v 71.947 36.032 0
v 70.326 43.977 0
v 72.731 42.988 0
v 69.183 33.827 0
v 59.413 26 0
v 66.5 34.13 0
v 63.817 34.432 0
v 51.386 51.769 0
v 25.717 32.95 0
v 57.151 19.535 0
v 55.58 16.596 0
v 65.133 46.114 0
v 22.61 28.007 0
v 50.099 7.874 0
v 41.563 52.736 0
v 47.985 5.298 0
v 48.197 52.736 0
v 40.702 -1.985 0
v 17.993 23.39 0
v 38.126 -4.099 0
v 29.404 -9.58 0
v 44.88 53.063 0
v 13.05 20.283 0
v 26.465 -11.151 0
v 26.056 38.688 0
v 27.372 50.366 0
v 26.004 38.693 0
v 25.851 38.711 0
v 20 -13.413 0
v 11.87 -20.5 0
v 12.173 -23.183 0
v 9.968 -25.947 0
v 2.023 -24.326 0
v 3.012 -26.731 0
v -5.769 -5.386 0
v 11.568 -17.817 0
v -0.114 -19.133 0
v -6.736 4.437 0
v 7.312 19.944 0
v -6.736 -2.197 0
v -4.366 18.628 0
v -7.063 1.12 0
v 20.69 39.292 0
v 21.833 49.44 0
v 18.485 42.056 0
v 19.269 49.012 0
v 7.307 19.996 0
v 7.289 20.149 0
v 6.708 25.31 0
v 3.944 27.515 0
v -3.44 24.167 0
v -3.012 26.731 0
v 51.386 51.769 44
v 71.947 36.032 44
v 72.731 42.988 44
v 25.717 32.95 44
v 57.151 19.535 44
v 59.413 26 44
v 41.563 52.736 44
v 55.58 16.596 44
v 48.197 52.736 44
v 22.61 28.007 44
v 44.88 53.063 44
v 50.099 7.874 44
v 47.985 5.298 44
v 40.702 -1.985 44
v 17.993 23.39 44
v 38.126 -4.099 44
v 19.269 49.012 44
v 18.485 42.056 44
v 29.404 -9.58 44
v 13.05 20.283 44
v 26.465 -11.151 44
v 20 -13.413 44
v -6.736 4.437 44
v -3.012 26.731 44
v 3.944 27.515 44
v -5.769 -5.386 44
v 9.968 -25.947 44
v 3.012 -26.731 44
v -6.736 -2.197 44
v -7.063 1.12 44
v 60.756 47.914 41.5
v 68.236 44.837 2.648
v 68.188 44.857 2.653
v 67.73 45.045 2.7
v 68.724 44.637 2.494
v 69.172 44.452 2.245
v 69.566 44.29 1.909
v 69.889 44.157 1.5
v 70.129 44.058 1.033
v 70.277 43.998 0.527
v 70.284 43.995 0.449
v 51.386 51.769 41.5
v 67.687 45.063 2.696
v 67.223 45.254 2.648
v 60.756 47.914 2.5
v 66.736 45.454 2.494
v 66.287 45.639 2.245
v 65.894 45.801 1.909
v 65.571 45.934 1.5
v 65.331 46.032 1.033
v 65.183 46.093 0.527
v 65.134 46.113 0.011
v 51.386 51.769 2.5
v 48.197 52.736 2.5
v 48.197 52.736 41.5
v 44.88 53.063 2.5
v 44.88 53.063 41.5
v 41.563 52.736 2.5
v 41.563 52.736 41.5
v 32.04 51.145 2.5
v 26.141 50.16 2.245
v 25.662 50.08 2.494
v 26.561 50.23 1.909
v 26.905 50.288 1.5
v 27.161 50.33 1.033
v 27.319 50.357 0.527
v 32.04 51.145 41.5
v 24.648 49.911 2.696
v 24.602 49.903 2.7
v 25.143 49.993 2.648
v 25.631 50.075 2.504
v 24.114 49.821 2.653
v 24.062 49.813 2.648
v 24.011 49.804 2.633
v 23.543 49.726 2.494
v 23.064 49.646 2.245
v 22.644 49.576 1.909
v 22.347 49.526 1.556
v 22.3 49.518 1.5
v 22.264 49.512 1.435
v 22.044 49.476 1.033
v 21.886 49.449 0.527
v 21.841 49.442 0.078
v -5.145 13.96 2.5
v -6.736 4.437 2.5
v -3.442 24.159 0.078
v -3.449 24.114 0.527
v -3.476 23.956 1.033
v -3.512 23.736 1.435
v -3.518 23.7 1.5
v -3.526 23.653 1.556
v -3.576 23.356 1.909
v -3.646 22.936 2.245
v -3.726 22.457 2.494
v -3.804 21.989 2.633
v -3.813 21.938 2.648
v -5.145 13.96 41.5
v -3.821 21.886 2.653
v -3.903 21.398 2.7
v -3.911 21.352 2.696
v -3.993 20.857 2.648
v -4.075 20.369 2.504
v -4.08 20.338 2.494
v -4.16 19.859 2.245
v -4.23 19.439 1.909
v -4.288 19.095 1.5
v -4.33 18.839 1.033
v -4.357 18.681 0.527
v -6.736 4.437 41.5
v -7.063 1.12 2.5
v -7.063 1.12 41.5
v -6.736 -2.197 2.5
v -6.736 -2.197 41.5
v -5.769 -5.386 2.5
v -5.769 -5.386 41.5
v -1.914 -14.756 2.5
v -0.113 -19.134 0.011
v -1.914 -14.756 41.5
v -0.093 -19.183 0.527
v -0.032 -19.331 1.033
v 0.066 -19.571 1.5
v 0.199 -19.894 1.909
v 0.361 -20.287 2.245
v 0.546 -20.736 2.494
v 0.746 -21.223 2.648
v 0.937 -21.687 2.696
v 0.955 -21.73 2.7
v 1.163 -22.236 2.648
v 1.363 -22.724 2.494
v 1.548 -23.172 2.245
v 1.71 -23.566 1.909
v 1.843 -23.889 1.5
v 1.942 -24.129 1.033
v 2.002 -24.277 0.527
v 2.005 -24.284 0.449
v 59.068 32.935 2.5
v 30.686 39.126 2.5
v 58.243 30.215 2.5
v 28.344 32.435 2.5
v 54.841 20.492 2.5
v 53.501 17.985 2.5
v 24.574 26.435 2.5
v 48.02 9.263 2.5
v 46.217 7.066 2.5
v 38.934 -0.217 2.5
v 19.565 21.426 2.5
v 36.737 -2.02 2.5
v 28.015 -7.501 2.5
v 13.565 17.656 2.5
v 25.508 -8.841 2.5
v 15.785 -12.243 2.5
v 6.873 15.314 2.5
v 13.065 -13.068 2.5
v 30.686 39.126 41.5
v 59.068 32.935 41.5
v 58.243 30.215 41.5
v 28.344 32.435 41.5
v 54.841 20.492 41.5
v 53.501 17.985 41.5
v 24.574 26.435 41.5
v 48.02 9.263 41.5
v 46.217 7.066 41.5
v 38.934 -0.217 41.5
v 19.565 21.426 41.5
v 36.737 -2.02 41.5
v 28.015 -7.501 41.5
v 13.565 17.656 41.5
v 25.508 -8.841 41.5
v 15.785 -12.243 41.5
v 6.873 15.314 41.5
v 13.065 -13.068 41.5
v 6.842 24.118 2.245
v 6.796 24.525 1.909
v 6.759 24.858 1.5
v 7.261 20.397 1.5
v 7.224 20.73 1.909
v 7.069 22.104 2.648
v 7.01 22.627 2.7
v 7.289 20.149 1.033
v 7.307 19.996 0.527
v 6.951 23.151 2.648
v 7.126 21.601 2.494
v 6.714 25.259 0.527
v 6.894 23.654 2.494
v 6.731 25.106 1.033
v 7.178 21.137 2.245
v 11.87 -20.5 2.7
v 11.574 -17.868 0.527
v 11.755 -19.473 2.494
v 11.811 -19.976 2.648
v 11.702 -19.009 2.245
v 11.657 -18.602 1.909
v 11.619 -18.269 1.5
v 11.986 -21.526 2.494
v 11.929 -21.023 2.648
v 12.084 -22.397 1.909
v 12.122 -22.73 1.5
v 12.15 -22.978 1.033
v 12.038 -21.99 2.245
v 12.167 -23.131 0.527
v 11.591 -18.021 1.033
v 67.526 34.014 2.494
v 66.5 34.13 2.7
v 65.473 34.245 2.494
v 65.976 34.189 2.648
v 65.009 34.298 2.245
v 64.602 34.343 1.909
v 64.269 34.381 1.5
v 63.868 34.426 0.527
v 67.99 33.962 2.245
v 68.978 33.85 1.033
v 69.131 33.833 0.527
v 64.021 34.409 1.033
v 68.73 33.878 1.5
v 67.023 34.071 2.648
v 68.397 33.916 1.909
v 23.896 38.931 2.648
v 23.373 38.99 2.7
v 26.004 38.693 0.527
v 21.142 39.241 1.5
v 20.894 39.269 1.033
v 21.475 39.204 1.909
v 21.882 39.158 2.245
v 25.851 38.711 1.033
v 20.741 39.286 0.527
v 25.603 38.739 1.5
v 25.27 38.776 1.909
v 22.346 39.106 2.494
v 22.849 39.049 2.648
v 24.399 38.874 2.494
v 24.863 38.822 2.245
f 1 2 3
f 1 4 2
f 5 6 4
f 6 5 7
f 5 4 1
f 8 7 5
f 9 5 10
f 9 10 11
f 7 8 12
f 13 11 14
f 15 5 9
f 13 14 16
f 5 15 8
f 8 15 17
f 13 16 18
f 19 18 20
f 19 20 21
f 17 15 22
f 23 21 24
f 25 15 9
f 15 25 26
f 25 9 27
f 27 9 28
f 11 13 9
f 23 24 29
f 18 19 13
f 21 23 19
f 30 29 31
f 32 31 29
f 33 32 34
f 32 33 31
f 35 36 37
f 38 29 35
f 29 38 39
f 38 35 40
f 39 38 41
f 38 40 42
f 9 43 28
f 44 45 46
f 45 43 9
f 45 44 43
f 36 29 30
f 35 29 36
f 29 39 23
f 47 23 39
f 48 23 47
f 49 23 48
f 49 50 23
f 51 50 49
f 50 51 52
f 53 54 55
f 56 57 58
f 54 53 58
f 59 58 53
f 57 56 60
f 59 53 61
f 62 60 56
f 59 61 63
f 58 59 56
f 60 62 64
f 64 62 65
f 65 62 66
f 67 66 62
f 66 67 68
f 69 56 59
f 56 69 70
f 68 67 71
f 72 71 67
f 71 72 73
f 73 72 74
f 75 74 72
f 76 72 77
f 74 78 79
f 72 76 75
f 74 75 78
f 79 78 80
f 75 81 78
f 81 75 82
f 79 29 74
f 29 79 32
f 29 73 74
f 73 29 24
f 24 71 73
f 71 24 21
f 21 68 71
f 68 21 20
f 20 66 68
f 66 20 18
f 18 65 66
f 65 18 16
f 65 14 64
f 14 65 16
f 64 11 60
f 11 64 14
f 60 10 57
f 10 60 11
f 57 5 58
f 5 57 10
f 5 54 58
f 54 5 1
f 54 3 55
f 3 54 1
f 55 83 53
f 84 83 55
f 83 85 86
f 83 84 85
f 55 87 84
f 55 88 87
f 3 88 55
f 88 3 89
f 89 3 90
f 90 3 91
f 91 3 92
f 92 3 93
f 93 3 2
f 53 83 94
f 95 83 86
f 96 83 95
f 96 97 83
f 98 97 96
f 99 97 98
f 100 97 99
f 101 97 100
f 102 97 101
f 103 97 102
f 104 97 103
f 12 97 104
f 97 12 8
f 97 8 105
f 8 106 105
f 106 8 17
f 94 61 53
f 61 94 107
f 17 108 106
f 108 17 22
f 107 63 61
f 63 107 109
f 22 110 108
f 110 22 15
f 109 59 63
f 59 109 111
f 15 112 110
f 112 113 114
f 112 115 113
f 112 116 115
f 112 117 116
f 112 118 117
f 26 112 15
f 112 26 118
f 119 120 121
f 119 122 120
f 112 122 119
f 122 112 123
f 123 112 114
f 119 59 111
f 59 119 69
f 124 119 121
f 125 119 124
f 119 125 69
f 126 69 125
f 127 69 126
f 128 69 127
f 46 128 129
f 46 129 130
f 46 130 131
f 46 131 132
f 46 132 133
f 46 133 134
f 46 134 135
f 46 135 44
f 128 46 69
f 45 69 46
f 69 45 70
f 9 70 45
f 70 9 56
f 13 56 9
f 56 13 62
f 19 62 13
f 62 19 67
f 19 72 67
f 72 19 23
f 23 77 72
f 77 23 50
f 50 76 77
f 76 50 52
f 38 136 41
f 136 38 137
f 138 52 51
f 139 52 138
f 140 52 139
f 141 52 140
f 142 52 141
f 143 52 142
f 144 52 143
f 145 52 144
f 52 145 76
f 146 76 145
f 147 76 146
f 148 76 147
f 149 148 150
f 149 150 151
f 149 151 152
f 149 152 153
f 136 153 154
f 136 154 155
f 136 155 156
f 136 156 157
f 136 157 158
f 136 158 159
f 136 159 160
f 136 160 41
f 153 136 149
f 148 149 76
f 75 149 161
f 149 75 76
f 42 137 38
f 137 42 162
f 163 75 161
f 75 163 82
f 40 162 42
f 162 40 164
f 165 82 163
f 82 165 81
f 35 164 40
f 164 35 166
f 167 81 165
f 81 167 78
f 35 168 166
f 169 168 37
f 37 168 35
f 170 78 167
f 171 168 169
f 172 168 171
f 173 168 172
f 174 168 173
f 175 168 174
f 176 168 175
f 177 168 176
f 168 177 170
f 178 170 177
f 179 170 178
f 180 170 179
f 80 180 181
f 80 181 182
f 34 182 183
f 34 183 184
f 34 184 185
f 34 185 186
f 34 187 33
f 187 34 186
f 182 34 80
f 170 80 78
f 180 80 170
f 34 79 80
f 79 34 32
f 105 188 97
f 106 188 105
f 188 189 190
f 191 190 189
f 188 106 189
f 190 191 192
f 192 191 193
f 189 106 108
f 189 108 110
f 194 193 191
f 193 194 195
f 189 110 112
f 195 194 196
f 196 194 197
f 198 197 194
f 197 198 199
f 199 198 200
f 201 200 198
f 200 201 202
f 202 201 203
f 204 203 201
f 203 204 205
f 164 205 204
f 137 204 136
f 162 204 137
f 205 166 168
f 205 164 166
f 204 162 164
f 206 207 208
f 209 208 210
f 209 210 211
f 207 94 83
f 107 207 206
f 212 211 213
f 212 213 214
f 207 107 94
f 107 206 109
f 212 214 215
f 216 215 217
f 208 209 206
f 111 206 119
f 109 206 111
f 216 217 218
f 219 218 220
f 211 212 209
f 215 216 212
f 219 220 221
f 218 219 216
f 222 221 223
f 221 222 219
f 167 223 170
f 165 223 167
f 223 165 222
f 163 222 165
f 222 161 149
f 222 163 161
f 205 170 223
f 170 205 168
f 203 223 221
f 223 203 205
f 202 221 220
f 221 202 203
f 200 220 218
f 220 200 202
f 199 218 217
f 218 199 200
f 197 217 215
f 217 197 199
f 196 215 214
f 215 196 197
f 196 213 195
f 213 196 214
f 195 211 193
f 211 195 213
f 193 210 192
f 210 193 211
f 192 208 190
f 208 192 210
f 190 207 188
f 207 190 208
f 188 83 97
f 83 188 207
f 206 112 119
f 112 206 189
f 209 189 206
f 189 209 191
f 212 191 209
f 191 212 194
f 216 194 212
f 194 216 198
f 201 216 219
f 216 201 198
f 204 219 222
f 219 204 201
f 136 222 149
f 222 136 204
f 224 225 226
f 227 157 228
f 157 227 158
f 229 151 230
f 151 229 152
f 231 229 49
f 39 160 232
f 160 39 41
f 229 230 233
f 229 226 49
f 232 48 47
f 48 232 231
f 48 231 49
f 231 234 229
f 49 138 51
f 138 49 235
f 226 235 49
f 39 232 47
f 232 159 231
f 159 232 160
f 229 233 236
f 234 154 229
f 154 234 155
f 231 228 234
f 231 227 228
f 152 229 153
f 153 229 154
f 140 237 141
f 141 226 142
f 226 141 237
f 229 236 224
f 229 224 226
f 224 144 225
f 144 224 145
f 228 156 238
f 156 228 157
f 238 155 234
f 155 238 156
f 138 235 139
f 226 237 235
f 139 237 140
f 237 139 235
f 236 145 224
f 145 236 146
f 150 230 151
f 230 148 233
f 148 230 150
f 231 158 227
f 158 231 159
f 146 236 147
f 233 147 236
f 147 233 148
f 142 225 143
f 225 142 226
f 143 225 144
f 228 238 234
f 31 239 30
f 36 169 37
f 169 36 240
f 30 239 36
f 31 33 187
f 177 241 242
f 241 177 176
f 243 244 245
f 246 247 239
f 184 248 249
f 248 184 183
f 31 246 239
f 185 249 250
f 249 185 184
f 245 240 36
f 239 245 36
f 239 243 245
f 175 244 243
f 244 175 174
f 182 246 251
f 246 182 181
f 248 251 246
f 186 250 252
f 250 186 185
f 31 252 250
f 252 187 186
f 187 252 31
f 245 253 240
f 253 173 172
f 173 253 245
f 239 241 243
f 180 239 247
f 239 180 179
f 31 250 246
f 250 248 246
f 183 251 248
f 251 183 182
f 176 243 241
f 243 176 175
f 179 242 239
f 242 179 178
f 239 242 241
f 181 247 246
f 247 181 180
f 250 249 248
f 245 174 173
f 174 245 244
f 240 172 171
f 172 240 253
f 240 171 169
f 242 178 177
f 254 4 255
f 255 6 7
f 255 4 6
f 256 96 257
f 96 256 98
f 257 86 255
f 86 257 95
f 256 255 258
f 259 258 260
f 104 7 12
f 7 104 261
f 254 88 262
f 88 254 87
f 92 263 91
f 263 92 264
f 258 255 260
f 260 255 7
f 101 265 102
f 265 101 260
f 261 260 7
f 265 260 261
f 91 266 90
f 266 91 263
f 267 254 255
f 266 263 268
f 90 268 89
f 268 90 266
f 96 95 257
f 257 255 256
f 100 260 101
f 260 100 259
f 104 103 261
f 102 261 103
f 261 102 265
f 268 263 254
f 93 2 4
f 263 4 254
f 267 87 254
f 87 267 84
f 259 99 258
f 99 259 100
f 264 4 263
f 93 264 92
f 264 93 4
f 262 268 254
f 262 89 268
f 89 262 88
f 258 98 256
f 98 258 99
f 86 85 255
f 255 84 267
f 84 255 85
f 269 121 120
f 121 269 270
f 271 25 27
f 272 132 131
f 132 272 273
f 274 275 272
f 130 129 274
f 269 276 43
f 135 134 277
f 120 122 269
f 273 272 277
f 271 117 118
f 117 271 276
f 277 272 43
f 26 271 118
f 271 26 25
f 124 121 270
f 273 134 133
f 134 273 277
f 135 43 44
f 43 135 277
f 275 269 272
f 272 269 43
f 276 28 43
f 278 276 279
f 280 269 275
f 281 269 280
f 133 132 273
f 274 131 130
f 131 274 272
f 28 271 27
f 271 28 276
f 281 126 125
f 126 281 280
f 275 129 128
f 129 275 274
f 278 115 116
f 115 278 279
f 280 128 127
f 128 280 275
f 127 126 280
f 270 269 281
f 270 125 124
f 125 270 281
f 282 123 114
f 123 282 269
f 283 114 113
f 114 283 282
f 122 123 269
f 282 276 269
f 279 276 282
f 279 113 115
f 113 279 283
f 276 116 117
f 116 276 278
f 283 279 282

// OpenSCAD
$fn = 32;

// ----------------------------------------------------------------------
// Air duct: 34 mm duct, 2.5 mm wall, 44 mm across
// ----------------------------------------------------------------------

// --- parameters (mm) ---
duct_r = 17;              // duct core radius
duct_d = 34;              // duct core diameter
wall = 2.5;               // duct wall thickness
height = 44;              // duct width (extrusion height)
port_r = 26.9;            // port flange half width
port_d = 53.8;            // port flange width
port_t = 7;               // port flange thickness
bolt_d = 5.4;             // port bolt holes
bolt_offset = 21.7;       // bolt hole offset from the port axis

difference() {
  /* outer hull chain: tube with a flat flange plate at every port */
  linear_extrude(height = 44) {
    hull() {
      polygon([[3.012, -26.731], [-3.012, 26.731], [3.944, 27.515], [9.968, -25.947]]);
      translate([9.937, 1.12]) circle(r = 17);
    }
    hull() {
      translate([9.937, 1.12]) circle(r = 17);
      translate([10.236, 1.153]) circle(r = 17);
    }
    hull() {
      translate([10.236, 1.153]) circle(r = 17);
      translate([19.959, 4.555]) circle(r = 17);
    }
    hull() {
      translate([19.959, 4.555]) circle(r = 17);
      translate([28.681, 10.036]) circle(r = 17);
    }
    hull() {
      translate([28.681, 10.036]) circle(r = 17);
      translate([35.964, 17.319]) circle(r = 17);
    }
    hull() {
      translate([35.964, 17.319]) circle(r = 17);
      translate([41.445, 26.041]) circle(r = 17);
    }
    hull() {
      translate([41.445, 26.041]) circle(r = 17);
      translate([44.847, 35.764]) circle(r = 17);
    }
    hull() {
      translate([44.847, 35.764]) circle(r = 17);
      translate([44.88, 36.063]) circle(r = 17);
    }
    hull() {
      translate([44.88, 36.063]) circle(r = 17);
      polygon([[19.269, 49.012], [72.731, 42.988], [71.947, 36.032], [18.485, 42.056]]);
    }
  }
  /* air passage: the same chain inset by the wall, 5 mm proud of the ports */
  translate([0, 0, 2.5]) linear_extrude(height = 39) {
    hull() {
      translate([-4.969, -0.56]) circle(r = 14.5);
      translate([10.236, 1.153]) circle(r = 14.5);
    }
    hull() {
      translate([10.236, 1.153]) circle(r = 14.5);
      translate([19.959, 4.555]) circle(r = 14.5);
    }
    hull() {
      translate([19.959, 4.555]) circle(r = 14.5);
      translate([28.681, 10.036]) circle(r = 14.5);
    }
    hull() {
      translate([28.681, 10.036]) circle(r = 14.5);
      translate([35.964, 17.319]) circle(r = 14.5);
    }
    hull() {
      translate([35.964, 17.319]) circle(r = 14.5);
      translate([41.445, 26.041]) circle(r = 14.5);
    }
    hull() {
      translate([41.445, 26.041]) circle(r = 14.5);
      translate([44.847, 35.764]) circle(r = 14.5);
    }
    hull() {
      translate([44.847, 35.764]) circle(r = 14.5);
      translate([46.56, 50.969]) circle(r = 14.5);
    }
  }
  translate([0, 0]) rotate([0, 0, -83.57]) translate([-21.7, -2.5]) rotate([-90, 0, 0]) cylinder(h = 12, d = 5.4);
  translate([0, 0]) rotate([0, 0, -83.57]) translate([21.7, -2.5]) rotate([-90, 0, 0]) cylinder(h = 12, d = 5.4);
  translate([46, 46]) rotate([0, 0, 173.57]) translate([-21.7, -2.5]) rotate([-90, 0, 0]) cylinder(h = 12, d = 5.4);
  translate([46, 46]) rotate([0, 0, 173.57]) translate([21.7, -2.5]) rotate([-90, 0, 0]) cylinder(h = 12, d = 5.4);
}
